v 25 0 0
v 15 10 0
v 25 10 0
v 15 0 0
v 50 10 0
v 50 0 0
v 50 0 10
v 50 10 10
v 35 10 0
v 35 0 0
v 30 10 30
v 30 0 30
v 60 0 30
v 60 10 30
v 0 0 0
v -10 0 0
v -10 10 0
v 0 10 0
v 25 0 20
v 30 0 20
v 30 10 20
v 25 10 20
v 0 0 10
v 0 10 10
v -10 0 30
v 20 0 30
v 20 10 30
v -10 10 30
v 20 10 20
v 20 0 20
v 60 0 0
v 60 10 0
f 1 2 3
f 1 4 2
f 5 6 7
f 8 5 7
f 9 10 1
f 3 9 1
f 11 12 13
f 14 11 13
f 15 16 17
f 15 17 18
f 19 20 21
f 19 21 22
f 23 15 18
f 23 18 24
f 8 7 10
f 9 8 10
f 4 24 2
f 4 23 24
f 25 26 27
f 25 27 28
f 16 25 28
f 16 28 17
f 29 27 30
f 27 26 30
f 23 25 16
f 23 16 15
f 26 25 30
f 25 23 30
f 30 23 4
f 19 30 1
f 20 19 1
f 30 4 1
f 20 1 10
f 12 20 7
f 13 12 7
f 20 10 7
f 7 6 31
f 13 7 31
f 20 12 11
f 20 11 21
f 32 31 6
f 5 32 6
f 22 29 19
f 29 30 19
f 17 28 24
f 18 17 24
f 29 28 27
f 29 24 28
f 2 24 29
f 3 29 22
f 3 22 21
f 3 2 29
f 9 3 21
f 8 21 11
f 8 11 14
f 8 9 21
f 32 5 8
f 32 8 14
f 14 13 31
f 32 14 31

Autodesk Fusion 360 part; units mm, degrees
sketch "Sketch1" plane through (0, 0, 0) normal (0, 1, 0) x (1, 0, 0)
  line L0 (20, -30) -> (-10, -30)
  line L1 (-10, -30) -> (-10, 0)
  line L2 (0, 0) -> (0, -10)
  line L3 (0, -10) -> (15, 0)
  line L4 (15, 0) -> (25, 0)
  line L5 (20, -30) -> (20, -20)
  line L6 (20, -20) -> (25, -20)
  line L7 (-10, 0) -> (0, 0)
  line L8 (50, 0) -> (50, -10)
  line L9 (60, 0) -> (50, 0)
  line L10 (50, -10) -> (35, 0)
  line L11 (60, -30) -> (60, 0)
  line L12 (30, -30) -> (60, -30)
  line L13 (35, 0) -> (25, 0)
  line L14 (30, -30) -> (30, -20)
  line L15 (30, -20) -> (25, -20)
  point P0 (50, 0)
  dimension "d14" = 30
  dimension "d15" = 30
  dimension "d18" = 10
  dimension "d19" = 15
  dimension "d20" = 10
  dimension "d21" = 15
  dimension "d22" = 10
  dimension "d23" = 5
  dimension "d25" = 10
extrude "Extrude1" add sketch "Sketch1" along normal blind 10
